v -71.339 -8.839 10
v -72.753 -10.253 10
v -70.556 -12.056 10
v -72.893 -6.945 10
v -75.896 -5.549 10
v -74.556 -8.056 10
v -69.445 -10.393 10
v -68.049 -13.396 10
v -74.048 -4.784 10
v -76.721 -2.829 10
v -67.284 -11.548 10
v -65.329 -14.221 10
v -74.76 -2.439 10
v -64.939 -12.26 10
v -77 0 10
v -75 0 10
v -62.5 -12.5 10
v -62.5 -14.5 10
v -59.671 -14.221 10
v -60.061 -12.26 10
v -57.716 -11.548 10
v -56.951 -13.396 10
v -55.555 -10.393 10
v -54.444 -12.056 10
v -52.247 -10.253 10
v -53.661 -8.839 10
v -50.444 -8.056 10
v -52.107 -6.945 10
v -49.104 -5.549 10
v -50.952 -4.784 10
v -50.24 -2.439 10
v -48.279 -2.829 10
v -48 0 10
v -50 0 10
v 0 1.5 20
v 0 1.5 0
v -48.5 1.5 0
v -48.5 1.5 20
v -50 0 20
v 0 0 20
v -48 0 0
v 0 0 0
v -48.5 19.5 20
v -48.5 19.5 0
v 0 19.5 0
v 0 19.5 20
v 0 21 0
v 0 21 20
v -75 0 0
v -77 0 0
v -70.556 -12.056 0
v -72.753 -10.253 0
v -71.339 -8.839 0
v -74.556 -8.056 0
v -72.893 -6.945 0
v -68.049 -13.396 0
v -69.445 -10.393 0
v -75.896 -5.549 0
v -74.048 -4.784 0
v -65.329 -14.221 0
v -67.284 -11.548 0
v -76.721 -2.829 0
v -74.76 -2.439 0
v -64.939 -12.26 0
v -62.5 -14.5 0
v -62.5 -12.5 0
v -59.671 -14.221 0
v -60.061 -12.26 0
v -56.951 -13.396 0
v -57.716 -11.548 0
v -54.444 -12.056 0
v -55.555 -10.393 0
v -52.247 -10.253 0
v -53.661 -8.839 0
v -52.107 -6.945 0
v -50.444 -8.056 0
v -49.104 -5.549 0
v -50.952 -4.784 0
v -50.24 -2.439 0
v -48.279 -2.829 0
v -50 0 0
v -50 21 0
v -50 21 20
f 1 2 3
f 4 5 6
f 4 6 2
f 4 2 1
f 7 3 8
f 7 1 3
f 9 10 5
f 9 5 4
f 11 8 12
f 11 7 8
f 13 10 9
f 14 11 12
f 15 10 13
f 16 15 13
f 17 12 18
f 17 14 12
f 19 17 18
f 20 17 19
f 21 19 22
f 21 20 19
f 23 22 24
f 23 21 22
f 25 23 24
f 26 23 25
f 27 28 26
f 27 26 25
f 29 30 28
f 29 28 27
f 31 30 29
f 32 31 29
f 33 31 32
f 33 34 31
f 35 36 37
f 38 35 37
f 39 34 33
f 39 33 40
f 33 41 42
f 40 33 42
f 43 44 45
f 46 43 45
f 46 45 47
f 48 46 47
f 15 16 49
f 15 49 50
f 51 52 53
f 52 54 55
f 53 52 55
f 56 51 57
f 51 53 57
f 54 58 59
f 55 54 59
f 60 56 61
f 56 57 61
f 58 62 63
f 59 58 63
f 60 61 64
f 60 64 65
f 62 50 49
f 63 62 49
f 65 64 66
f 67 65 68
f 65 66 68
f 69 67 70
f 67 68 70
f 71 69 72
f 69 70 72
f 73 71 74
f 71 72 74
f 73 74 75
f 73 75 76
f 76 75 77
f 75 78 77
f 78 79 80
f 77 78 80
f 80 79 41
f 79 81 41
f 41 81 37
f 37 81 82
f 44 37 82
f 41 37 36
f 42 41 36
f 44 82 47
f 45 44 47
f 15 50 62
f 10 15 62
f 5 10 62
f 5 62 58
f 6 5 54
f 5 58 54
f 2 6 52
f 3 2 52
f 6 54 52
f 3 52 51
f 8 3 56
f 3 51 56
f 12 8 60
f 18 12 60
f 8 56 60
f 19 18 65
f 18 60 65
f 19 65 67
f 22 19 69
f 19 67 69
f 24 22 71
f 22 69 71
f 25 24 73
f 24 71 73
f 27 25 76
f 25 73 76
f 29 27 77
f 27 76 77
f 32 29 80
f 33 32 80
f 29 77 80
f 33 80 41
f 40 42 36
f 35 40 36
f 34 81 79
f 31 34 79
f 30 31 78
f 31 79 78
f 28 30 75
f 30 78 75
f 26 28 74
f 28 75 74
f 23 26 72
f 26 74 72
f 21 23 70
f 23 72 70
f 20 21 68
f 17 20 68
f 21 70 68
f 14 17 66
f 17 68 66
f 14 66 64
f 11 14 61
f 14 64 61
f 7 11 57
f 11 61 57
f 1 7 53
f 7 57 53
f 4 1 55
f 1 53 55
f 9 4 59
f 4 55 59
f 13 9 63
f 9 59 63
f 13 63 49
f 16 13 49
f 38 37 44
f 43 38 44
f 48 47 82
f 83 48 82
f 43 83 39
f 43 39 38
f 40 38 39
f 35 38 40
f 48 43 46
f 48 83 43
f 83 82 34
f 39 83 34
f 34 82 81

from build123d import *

# Parameters (mm, degrees)
F1_DEPTH = 20
F2_DEPTH = 10


# Not quite as in the source:
# - a feature names something its author has since deleted; it is built from what else it names


with BuildPart() as f1:
    # F0 (on Top) → F1 (new body)
    with BuildSketch(Plane.XY):
        Polygon((-50, 21), (-50, 0), (-48, 0), (0, 0), (0, 1.5), (-48.5, 1.5), (-48.5, 19.5), (0, 19.5), (0, 21), align=None)
    extrude(amount=F1_DEPTH)

    # F0 (on Top) → F2 (join)
    with BuildSketch(Plane.XY):
        with BuildLine():
            ThreePointArc((-50, 0), (-62.5, -12.5), (-75, 0))
            Line((-75, 0), (-77, 0))
            ThreePointArc((-77, 0), (-62.5, -14.5), (-48, 0))
            Line((-48, 0), (-50, 0))
        make_face()
    extrude(amount=F2_DEPTH)


solid = f1.part
